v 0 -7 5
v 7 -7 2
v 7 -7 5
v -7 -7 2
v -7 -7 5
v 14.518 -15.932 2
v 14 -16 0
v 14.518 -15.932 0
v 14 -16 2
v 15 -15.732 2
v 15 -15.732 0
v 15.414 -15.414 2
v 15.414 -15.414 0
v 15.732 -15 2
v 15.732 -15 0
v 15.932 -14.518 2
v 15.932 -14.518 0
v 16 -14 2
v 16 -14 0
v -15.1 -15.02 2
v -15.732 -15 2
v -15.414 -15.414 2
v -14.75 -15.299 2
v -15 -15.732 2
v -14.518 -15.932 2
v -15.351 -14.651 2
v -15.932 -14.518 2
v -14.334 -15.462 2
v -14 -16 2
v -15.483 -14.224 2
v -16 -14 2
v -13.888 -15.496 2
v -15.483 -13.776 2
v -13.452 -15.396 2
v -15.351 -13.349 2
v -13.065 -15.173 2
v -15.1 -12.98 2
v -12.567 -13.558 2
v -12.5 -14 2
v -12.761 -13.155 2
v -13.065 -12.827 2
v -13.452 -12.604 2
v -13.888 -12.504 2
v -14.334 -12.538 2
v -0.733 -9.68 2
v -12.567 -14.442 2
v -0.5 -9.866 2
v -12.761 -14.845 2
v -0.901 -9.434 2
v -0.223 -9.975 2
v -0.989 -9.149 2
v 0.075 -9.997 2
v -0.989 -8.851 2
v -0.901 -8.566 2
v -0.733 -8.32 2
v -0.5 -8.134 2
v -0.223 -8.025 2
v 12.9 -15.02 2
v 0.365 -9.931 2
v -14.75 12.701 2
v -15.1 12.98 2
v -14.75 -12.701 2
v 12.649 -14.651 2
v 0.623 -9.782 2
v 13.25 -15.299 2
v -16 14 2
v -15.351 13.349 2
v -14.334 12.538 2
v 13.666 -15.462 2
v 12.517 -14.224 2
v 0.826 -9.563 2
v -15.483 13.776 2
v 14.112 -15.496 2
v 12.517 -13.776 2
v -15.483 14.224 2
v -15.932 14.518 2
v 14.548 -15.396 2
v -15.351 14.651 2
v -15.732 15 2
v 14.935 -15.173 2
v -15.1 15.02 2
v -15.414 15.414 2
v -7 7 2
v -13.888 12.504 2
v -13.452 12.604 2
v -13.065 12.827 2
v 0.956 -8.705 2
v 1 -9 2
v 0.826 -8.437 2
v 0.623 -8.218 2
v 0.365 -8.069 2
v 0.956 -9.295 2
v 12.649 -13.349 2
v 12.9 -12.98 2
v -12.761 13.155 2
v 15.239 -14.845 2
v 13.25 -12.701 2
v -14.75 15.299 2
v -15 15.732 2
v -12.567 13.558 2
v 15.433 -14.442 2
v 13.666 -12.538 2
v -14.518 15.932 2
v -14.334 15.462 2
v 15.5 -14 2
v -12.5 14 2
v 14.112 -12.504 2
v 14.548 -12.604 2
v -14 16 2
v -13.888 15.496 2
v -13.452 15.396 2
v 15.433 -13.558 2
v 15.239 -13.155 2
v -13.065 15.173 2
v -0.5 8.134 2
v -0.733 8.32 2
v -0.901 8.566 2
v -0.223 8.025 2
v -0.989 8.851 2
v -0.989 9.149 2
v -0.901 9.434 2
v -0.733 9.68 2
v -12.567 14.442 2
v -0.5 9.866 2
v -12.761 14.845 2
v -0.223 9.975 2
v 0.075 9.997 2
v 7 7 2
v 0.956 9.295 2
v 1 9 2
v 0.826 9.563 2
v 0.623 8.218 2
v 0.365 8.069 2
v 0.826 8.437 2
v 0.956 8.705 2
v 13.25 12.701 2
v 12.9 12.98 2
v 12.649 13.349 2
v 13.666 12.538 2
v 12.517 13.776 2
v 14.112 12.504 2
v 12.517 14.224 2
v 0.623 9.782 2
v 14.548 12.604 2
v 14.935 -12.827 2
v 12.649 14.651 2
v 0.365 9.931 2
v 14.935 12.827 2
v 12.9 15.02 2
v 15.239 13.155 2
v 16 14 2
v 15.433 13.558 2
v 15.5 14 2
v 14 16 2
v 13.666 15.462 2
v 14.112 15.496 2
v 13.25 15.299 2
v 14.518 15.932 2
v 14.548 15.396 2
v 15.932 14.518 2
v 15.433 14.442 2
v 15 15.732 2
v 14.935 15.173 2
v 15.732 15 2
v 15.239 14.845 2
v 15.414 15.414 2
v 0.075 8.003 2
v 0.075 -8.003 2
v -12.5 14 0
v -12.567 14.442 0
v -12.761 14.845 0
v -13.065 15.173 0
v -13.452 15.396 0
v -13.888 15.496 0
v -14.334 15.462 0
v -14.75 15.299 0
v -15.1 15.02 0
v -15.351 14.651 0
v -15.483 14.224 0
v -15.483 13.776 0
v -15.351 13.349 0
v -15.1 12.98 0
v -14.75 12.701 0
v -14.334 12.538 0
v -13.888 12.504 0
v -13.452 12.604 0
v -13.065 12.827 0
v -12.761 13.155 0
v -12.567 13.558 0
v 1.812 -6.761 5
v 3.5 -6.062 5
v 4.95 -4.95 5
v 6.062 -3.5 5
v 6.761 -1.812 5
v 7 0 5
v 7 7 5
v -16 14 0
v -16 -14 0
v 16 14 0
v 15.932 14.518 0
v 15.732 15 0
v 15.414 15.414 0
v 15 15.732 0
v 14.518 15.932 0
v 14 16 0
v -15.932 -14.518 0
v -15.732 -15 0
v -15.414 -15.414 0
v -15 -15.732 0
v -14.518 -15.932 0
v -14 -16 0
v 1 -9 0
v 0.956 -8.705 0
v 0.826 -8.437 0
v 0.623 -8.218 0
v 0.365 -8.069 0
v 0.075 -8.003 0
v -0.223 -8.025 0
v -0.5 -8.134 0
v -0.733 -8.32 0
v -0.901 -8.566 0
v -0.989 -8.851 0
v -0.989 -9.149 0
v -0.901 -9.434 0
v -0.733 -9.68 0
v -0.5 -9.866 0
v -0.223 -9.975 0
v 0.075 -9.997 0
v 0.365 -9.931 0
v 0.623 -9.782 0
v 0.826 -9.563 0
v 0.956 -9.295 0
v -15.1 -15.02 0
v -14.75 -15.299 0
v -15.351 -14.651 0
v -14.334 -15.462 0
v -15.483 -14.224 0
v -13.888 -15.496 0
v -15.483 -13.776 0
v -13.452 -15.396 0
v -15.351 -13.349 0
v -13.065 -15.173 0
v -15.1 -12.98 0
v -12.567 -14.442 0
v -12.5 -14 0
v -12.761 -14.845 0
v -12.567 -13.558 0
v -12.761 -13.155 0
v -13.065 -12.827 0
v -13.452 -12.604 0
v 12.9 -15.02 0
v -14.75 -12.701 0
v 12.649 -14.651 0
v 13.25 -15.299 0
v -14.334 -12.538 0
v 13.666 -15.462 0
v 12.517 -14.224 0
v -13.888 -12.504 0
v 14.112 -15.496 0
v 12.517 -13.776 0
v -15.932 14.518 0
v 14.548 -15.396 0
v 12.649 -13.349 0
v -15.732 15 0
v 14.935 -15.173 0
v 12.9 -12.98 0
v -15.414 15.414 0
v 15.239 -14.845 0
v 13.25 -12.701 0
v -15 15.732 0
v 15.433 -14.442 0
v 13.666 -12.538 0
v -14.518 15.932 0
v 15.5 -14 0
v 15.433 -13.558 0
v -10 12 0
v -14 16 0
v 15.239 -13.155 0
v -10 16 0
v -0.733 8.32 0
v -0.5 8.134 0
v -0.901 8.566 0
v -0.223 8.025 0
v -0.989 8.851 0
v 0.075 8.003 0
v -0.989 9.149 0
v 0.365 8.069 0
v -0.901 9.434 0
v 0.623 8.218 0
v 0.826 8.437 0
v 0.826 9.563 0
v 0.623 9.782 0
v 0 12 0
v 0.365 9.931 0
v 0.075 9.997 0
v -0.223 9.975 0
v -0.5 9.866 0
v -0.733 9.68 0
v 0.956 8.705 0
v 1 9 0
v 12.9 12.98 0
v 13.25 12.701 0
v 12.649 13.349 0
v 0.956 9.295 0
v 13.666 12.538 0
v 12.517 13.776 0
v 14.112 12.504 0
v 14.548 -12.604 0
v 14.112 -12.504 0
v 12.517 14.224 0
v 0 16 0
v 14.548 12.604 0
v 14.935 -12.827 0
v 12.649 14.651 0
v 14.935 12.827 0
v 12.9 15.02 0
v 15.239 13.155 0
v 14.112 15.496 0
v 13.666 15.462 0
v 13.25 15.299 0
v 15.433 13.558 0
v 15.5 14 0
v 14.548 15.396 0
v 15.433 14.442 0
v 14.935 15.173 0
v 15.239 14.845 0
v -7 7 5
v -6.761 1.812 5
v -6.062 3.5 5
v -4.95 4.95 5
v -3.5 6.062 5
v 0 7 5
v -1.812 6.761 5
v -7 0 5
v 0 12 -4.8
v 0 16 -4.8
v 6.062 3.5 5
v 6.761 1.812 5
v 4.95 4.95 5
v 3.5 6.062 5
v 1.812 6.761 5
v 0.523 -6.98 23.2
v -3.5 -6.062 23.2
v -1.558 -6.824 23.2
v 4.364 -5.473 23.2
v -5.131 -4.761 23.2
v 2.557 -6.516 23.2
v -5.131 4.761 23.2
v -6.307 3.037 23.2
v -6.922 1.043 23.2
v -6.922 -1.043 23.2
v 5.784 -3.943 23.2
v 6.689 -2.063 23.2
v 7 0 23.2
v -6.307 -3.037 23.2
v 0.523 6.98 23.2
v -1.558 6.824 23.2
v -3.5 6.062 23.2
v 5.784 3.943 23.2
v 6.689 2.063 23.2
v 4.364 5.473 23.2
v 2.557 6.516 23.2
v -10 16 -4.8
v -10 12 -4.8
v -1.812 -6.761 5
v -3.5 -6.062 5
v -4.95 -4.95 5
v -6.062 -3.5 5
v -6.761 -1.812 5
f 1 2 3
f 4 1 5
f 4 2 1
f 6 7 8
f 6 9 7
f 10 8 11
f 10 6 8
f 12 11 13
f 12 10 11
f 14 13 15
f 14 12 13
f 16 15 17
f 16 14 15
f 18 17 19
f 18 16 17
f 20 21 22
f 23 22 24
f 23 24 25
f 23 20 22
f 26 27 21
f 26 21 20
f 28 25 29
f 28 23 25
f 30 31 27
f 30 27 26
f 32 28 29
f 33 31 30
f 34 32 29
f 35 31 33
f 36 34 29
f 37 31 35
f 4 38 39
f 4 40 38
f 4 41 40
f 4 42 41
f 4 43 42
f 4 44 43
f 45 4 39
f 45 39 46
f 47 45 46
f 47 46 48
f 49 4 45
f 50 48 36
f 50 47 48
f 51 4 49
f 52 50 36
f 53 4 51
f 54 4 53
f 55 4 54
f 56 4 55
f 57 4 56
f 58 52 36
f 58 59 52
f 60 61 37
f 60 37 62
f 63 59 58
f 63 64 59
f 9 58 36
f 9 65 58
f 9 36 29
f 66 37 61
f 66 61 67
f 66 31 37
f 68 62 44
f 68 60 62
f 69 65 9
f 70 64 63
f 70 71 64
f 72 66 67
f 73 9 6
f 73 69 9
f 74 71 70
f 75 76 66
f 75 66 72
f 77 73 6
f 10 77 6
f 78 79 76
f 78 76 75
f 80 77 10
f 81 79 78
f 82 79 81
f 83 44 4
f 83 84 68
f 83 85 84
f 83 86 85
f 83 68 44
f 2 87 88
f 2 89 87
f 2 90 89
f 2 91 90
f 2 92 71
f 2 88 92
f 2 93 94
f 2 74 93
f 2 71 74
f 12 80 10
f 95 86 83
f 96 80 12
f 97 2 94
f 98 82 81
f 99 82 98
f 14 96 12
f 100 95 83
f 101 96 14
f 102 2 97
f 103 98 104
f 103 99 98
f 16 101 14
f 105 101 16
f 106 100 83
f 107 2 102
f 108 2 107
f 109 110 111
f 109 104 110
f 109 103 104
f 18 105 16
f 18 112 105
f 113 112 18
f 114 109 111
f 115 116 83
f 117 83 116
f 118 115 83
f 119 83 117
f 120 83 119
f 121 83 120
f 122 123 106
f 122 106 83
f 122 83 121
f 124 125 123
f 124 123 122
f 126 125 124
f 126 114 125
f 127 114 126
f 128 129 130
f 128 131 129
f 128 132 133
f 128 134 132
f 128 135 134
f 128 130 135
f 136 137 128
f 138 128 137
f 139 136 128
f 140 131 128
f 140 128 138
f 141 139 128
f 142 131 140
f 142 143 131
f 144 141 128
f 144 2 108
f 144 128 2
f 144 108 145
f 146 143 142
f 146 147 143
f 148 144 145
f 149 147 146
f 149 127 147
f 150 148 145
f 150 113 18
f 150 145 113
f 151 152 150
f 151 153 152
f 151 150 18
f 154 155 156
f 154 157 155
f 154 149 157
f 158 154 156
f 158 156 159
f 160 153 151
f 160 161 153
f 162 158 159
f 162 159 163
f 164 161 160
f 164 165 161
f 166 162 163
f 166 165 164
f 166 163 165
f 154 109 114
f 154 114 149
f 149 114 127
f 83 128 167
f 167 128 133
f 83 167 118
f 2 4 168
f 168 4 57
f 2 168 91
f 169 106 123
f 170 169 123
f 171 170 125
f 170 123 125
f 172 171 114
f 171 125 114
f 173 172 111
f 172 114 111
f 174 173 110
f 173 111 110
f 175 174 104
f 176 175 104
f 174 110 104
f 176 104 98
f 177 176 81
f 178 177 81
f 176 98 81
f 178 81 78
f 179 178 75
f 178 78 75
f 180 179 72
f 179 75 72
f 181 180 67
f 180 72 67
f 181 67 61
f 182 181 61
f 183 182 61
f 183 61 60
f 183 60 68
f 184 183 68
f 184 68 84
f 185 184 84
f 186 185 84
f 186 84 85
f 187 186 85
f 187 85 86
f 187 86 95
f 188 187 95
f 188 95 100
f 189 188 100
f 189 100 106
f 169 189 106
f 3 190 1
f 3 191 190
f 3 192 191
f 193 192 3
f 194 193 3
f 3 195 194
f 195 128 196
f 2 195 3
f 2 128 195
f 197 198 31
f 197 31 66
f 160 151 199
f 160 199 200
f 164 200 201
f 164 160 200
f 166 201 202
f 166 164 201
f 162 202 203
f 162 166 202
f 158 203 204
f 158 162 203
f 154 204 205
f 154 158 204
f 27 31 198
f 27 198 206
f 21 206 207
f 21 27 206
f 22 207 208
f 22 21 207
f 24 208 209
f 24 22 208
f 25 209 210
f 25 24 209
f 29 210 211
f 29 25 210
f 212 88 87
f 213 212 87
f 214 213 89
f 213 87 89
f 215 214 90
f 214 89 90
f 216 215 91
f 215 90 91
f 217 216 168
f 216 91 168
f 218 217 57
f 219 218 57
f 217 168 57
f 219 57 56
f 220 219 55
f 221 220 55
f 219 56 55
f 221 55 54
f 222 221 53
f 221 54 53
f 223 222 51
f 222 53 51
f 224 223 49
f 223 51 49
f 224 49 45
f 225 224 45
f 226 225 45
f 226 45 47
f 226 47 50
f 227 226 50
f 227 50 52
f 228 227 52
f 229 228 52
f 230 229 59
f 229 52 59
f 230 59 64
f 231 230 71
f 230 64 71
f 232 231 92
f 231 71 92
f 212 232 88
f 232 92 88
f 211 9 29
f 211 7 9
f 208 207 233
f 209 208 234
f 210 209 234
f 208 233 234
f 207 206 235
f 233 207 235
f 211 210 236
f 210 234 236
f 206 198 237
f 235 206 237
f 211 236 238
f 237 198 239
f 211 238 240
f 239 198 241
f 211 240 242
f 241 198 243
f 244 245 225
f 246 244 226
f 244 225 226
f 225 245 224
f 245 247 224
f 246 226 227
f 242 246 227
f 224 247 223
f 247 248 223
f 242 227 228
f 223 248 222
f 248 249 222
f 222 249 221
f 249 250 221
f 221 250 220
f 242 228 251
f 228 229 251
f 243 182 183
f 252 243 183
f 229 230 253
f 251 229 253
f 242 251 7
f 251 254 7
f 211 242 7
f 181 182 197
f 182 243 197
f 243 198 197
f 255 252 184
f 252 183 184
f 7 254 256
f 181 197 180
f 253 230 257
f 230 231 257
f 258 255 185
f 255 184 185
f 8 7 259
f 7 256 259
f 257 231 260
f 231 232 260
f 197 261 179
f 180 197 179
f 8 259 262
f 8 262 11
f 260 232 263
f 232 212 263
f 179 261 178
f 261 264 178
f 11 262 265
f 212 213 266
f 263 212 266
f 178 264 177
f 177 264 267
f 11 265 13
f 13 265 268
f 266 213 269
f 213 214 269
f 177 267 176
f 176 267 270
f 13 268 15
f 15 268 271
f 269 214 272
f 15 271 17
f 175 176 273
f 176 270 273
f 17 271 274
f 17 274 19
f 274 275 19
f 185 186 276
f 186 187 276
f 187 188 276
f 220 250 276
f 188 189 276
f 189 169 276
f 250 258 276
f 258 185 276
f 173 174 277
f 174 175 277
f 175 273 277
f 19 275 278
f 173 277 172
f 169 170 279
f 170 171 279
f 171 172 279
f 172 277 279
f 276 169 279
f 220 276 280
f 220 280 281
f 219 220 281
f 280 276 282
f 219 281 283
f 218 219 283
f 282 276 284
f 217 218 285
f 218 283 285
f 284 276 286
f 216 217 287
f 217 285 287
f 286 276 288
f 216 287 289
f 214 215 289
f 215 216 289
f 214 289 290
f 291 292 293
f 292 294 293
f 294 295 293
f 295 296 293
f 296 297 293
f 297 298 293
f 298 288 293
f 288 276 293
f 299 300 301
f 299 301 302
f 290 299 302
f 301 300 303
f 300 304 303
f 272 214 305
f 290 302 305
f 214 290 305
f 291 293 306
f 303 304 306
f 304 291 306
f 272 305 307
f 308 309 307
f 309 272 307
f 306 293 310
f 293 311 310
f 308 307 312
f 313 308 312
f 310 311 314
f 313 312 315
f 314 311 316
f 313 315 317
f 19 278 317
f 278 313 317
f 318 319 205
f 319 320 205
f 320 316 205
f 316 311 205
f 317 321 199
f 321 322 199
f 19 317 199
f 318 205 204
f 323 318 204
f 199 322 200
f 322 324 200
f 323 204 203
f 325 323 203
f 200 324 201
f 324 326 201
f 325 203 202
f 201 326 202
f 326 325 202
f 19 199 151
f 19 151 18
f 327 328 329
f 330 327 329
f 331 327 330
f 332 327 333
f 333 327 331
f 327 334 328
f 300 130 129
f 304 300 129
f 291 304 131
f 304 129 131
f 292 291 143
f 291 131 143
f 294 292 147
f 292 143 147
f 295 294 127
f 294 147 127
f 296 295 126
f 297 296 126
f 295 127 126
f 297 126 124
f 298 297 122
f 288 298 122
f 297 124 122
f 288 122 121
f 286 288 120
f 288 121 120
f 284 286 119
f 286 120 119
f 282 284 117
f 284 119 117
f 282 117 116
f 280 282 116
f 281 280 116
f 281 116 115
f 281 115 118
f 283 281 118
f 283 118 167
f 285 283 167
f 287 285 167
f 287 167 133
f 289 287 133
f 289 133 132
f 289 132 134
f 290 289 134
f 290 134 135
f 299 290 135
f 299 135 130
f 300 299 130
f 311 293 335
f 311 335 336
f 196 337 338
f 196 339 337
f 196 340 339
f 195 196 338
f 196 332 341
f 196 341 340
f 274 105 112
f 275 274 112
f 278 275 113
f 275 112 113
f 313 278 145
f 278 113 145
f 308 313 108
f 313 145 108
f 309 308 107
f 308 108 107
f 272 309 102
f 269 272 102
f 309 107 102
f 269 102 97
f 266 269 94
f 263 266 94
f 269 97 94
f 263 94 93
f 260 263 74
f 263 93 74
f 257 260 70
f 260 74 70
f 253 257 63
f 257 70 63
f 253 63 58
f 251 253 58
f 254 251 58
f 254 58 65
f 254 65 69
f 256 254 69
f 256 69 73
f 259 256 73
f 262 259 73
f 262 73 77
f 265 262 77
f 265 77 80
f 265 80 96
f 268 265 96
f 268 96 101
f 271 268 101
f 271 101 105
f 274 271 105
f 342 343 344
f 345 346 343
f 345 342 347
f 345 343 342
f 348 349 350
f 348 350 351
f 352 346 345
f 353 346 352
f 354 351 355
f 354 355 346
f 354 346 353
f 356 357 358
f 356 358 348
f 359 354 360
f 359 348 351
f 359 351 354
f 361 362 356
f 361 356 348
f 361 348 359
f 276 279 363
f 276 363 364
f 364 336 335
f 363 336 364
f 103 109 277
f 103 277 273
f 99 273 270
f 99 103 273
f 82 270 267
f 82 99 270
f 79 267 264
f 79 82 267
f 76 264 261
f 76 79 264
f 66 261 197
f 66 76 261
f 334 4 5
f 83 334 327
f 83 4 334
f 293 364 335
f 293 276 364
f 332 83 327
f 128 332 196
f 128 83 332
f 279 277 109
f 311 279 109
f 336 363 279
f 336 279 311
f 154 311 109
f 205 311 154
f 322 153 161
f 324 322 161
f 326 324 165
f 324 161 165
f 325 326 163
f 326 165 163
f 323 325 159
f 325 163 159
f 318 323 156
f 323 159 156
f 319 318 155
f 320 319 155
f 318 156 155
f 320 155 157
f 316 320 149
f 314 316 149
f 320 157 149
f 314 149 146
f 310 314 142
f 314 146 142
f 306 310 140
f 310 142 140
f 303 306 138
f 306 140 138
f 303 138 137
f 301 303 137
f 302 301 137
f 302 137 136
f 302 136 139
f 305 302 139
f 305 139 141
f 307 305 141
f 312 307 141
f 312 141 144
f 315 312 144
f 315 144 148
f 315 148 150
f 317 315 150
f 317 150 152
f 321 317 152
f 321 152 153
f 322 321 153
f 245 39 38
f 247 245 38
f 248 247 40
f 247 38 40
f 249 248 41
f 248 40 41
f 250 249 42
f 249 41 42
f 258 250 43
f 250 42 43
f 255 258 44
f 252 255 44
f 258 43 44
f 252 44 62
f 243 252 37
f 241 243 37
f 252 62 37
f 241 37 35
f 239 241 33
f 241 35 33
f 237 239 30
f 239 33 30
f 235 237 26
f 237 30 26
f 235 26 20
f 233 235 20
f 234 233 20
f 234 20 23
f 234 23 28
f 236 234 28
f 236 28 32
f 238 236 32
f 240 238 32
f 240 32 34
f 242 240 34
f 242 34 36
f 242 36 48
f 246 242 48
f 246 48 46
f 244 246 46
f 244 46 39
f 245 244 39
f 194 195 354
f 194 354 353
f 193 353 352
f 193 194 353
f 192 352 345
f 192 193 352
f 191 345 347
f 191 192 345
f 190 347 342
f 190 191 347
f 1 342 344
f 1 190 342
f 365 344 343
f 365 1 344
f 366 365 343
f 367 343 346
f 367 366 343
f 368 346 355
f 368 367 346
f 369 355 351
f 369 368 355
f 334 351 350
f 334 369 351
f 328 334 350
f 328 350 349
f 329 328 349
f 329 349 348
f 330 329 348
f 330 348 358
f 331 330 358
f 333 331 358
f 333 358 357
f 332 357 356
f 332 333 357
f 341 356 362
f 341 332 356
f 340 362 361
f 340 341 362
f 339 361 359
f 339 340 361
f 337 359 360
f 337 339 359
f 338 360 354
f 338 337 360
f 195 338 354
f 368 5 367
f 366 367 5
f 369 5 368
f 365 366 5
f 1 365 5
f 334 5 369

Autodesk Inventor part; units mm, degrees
ref_plane "YZ Plane" through (0, 0, 0) normal (1, 0, 0) x (0, 1, 0)
ref_plane "XZ Plane" through (0, 0, 0) normal (0, 1, 0) x (-1, 0, 0)
ref_plane "XY Plane" through (0, 0, 0) normal (0, 0, 1) x (1, 0, 0)
sketch "스케치1" plane through (0, 0, 0) normal (0, 0, 1) x (1, 0, 0)
  line L0 (-16, 16) -> (16, 16)
  line L1 (16, 16) -> (16, -16)
  line L2 (16, -16) -> (-16, -16)
  line L3 (-16, -16) -> (-16, 16)
  point P0 (0, 0)
  dimension "d0" = 32
  dimension "d1" = 32
  dimension "d2" = 16
  dimension "d3" = 16
extrude "돌출1" add sketch "스케치1" along normal blind 2
sketch "스케치2" plane through (0, 0, 2) normal (0, 0, 1) x (1, 0, 0)
  circle A0 centre (-14, 14) radius 1.5
  circle A1 centre (14, 14) radius 1.5
  circle A2 centre (-14, -14) radius 1.5
  circle A3 centre (14, -14) radius 1.5
  line L0 (-16, 16) -> (-16, -16) projected
  line L1 (16, 16) -> (-16, 16) projected
  line L2 (-16, -16) -> (16, -16) projected
  line L3 (16, -16) -> (16, 16) projected
  point P0 (0, 0)
  dimension "d6" = 3
  dimension "d7" = 3
  dimension "d8" = 3
  dimension "d9" = 3
  dimension "d10" = 28
  dimension "d12" = 28
  dimension "d13" = 2
  dimension "d14" = 14
  dimension "d15" = 2
  dimension "d16" = 2
  dimension "d17" = 2
  dimension "d18" = 2
  dimension "d19" = 2
  dimension "d20" = 2
extrude "돌출2" cut sketch "스케치2" against normal up to surface (2 mm away) contours A0 | A1 | A2 | A3
sketch "스케치3" plane through (0, 0, 2) normal (0, 0, 1) x (1, 0, 0)
  line L0 (-7, 7) -> (7, 7)
  line L1 (7, 7) -> (7, -7)
  line L2 (7, -7) -> (-7, -7)
  line L3 (-7, -7) -> (-7, 7)
  point P0 (0, 0)
  dimension "d23" = 7
  dimension "d24" = 14
  dimension "d25" = 7
  dimension "d26" = 14
extrude "돌출3" add sketch "스케치3" along normal blind 3
sketch "스케치4" plane through (0, 0, 5) normal (0, 0, 1) x (1, 0, 0)
  circle A0 centre (0, 0) radius 7
  dimension "d29" = 14
extrude "돌출4" add sketch "스케치4" along normal blind 18.2
sketch "스케치6" plane through (0, 0, 2) normal (0, 0, 1) x (1, 0, 0)
  circle A0 centre (0, 9) radius 1
  circle A1 centre (0, -9) radius 1
  line L0 (7, 7) -> (0, 7) projected
  line L1 (0, -7) -> (7, -7) projected
  line L2 (-16, 16) -> (-16, -16) projected
  point P0 (0, 0)
  dimension "d32" = 2
  dimension "d33" = 2
  dimension "d34" = 2
  dimension "d35" = 2
  dimension "d36" = 16
  dimension "d37" = 16
extrude "돌출5" cut sketch "스케치6" against normal up to surface (2 mm away)
sketch "스케치5" plane through (0, 0, 0) normal (0, 0, -1) x (-1, 0, 0)
  line L0 (-16, 16) -> (16, 16) projected
  line L1 (10, 12) -> (0, 12)
  line L2 (0, 12) -> (0, 16)
  line L3 (0, 16) -> (10, 16)
  line L4 (10, 16) -> (10, 12)
  point P0 (0, 0)
  dimension "d40" = 4
  dimension "d41" = 10
extrude "돌출6" add sketch "스케치5" along normal blind 4.8
fillet "모깎기1" radius 2 4 edges at (-16, -16, 1) (-16, 16, 1) (16, 16, 1) (16, -16, 1)
equation "\"d2\" = 0.5 * d1"
equation "\"d3\" = 0.5 * d0"
properties part number "Camera"
